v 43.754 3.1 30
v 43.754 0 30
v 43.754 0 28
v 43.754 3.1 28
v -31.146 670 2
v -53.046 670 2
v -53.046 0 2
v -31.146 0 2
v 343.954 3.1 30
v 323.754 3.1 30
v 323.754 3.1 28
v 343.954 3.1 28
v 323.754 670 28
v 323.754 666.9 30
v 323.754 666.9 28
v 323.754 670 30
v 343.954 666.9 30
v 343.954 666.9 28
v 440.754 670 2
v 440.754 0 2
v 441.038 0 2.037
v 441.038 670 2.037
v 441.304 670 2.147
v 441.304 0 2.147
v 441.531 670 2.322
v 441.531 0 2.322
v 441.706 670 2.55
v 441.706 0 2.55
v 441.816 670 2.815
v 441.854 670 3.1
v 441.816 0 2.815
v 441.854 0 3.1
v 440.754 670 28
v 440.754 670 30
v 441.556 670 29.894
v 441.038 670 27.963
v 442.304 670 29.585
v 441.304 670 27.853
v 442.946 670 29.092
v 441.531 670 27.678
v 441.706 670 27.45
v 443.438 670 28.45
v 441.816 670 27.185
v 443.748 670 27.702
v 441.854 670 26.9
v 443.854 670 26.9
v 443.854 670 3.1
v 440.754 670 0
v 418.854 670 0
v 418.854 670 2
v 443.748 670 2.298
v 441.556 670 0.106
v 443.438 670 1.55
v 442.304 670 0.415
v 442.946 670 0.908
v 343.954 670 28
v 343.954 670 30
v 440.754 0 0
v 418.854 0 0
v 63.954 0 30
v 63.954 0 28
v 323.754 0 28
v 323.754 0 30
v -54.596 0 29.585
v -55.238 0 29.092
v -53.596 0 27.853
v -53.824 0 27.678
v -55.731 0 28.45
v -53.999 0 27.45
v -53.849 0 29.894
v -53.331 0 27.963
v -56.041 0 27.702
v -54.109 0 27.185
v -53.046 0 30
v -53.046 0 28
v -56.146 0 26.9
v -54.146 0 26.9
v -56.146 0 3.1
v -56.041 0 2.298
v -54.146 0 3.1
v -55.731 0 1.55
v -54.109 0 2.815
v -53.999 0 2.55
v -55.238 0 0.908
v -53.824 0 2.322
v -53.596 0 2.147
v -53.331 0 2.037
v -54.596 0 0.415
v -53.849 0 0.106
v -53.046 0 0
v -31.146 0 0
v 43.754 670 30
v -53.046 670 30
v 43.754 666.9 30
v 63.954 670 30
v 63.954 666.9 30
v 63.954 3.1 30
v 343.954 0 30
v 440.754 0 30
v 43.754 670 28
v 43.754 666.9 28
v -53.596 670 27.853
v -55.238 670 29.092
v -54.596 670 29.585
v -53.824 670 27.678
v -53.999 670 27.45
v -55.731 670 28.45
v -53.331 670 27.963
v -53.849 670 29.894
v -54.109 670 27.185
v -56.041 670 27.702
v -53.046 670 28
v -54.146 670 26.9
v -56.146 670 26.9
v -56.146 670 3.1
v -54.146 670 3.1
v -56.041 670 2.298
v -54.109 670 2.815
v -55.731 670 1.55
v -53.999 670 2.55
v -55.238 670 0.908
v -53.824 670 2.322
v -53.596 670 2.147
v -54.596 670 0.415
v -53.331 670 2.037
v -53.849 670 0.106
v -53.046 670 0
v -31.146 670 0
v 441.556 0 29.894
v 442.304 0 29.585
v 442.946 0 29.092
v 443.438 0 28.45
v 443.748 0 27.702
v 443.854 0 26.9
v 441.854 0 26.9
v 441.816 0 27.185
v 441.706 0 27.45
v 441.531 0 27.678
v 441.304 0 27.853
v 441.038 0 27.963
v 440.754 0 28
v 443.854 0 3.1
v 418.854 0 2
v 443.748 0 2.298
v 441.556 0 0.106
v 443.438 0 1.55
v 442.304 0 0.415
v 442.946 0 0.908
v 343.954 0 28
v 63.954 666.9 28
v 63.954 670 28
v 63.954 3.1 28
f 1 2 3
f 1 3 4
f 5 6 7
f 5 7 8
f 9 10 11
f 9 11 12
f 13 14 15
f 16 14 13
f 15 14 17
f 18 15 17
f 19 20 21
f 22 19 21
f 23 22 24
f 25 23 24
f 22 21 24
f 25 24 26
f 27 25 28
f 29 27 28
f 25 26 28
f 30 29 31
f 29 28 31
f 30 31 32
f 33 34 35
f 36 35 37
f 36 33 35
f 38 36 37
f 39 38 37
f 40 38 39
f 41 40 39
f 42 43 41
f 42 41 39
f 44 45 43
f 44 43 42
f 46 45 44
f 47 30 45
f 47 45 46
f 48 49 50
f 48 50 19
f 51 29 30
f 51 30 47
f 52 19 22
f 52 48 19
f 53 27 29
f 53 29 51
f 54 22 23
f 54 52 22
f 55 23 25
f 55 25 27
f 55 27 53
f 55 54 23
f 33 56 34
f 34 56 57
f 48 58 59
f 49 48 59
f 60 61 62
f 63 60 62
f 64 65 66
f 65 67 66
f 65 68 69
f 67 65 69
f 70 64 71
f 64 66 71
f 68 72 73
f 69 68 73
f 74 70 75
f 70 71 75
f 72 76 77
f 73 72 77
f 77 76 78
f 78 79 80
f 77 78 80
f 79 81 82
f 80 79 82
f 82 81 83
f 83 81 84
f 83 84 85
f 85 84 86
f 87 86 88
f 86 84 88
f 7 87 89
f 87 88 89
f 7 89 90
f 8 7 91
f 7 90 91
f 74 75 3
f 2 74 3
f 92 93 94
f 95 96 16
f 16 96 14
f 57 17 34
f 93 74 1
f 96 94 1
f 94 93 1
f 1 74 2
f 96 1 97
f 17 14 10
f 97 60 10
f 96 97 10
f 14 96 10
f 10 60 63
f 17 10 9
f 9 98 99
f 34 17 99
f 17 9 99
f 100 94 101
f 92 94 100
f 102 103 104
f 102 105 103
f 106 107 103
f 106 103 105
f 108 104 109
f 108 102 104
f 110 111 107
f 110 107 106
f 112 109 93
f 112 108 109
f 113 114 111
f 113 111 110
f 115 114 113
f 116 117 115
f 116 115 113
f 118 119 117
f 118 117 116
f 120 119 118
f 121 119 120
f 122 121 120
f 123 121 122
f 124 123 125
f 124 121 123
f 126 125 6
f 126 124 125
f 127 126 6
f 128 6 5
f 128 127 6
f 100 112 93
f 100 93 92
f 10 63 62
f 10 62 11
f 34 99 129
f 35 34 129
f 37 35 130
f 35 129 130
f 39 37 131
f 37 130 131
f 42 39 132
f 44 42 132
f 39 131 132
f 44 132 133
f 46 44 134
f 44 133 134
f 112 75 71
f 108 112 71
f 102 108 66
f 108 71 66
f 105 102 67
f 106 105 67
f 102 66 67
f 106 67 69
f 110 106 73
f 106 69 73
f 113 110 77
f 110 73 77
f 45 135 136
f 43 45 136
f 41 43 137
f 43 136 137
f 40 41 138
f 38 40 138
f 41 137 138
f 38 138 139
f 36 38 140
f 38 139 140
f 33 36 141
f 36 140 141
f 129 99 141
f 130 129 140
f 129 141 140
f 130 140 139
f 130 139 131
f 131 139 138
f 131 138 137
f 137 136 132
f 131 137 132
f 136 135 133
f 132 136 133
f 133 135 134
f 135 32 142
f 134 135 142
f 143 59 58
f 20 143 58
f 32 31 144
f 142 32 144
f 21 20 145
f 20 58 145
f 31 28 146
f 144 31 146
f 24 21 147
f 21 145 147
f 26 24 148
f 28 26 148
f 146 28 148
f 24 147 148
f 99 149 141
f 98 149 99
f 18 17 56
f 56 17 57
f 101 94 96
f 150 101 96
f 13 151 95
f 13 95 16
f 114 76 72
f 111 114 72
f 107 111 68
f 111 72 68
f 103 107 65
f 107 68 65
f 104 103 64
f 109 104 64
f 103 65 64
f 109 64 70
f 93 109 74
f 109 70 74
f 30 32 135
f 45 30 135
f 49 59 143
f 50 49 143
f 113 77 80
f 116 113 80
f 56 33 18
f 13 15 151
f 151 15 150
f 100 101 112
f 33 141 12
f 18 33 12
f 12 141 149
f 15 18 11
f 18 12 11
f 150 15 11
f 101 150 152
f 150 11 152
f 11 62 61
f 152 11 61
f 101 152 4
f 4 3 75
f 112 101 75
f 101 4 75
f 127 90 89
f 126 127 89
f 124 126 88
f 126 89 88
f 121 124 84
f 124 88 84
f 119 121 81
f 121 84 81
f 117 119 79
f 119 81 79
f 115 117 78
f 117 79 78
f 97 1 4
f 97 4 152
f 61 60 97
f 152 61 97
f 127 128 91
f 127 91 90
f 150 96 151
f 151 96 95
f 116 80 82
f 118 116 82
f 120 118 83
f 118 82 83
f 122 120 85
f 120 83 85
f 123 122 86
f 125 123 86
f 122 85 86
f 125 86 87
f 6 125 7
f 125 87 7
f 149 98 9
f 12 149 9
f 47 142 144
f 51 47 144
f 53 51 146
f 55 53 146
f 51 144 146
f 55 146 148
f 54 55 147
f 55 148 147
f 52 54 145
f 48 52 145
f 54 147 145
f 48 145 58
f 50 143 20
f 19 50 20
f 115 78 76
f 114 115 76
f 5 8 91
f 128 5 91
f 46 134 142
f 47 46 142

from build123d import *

# Parameters (mm, degrees)
SM_BASE_FLANGE_1_DEPTH = 670
SKETCH_2_W             = 20.2
SKETCH_2_H             = 3.1
CUT_EXTRUDE_1_DEPTH    = 10
SKETCH_4_W             = 20.2
SKETCH_4_H             = 3.1
CUT_EXTRUDE_3_DEPTH    = 10


# Sheet-metal steps are written as plain solids
with BuildPart() as part:
    # Sketch 1 → Базовая кромка1 (new body)
    with BuildSketch(Plane(origin=(0, 0, 0), x_dir=(1, 0, 0), z_dir=(0, 1, 0))):
        with BuildLine():
            Line((-31.146330545, 0), (-53.046330545, 0))
            ThreePointArc((-53.046330545, 0), (-55.238361567, -0.907968978), (-56.146330545, -3.1))
            Line((-56.146330545, -3.1), (-56.146330545, -26.9))
            ThreePointArc((-56.146330545, -26.9), (-55.238361567, -29.092031022), (-53.046330545, -30))
            Line((-53.046330545, -30), (440.753669455, -30))
            ThreePointArc((440.753669455, -30), (442.945700477, -29.092031022), (443.853669455, -26.9))
            Line((443.853669455, -26.9), (443.853669455, -3.1))
            ThreePointArc((443.853669455, -3.1), (442.945700477, -0.907968978), (440.753669455, 0))
            Line((440.753669455, 0), (418.853669455, 0))
            Line((418.853669455, 0), (418.853669455, -2))
            Line((418.853669455, -2), (440.753669455, -2))
            ThreePointArc((440.753669455, -2), (441.531486914, -2.322182541), (441.853669455, -3.1))
            Line((441.853669455, -3.1), (441.853669455, -26.9))
            ThreePointArc((441.853669455, -26.9), (441.531486914, -27.677817459), (440.753669455, -28))
            Line((440.753669455, -28), (-53.046330545, -28))
            ThreePointArc((-53.046330545, -28), (-53.824148004, -27.677817459), (-54.146330545, -26.9))
            Line((-54.146330545, -26.9), (-54.146330545, -3.1))
            ThreePointArc((-54.146330545, -3.1), (-53.824148004, -2.322182541), (-53.046330545, -2))
            Line((-53.046330545, -2), (-31.146330545, -2))
            Line((-31.146330545, -2), (-31.146330545, 0))
        make_face()
    extrude(amount=SM_BASE_FLANGE_1_DEPTH)

    # Эскиз2 → Вырез-Вытянуть1 (cut)
    with BuildSketch(Plane.XY.offset(30)):
        with Locations((53.853669455, 1.55)):
            Rectangle(SKETCH_2_W, SKETCH_2_H)
        with Locations((333.853669455, 1.55)):
            Rectangle(SKETCH_2_W, SKETCH_2_H)
    extrude(amount=-CUT_EXTRUDE_1_DEPTH, mode=Mode.SUBTRACT)

    # Эскиз4 → Вырез-Вытянуть3 (cut)
    with BuildSketch(Plane.XY.offset(30)):
        with Locations((53.853669455, 668.45)):
            Rectangle(SKETCH_4_W, SKETCH_4_H)
        with Locations((333.853669455, 668.45)):
            Rectangle(SKETCH_4_W, SKETCH_4_H)
    extrude(amount=-CUT_EXTRUDE_3_DEPTH, mode=Mode.SUBTRACT)


solid = part.part
